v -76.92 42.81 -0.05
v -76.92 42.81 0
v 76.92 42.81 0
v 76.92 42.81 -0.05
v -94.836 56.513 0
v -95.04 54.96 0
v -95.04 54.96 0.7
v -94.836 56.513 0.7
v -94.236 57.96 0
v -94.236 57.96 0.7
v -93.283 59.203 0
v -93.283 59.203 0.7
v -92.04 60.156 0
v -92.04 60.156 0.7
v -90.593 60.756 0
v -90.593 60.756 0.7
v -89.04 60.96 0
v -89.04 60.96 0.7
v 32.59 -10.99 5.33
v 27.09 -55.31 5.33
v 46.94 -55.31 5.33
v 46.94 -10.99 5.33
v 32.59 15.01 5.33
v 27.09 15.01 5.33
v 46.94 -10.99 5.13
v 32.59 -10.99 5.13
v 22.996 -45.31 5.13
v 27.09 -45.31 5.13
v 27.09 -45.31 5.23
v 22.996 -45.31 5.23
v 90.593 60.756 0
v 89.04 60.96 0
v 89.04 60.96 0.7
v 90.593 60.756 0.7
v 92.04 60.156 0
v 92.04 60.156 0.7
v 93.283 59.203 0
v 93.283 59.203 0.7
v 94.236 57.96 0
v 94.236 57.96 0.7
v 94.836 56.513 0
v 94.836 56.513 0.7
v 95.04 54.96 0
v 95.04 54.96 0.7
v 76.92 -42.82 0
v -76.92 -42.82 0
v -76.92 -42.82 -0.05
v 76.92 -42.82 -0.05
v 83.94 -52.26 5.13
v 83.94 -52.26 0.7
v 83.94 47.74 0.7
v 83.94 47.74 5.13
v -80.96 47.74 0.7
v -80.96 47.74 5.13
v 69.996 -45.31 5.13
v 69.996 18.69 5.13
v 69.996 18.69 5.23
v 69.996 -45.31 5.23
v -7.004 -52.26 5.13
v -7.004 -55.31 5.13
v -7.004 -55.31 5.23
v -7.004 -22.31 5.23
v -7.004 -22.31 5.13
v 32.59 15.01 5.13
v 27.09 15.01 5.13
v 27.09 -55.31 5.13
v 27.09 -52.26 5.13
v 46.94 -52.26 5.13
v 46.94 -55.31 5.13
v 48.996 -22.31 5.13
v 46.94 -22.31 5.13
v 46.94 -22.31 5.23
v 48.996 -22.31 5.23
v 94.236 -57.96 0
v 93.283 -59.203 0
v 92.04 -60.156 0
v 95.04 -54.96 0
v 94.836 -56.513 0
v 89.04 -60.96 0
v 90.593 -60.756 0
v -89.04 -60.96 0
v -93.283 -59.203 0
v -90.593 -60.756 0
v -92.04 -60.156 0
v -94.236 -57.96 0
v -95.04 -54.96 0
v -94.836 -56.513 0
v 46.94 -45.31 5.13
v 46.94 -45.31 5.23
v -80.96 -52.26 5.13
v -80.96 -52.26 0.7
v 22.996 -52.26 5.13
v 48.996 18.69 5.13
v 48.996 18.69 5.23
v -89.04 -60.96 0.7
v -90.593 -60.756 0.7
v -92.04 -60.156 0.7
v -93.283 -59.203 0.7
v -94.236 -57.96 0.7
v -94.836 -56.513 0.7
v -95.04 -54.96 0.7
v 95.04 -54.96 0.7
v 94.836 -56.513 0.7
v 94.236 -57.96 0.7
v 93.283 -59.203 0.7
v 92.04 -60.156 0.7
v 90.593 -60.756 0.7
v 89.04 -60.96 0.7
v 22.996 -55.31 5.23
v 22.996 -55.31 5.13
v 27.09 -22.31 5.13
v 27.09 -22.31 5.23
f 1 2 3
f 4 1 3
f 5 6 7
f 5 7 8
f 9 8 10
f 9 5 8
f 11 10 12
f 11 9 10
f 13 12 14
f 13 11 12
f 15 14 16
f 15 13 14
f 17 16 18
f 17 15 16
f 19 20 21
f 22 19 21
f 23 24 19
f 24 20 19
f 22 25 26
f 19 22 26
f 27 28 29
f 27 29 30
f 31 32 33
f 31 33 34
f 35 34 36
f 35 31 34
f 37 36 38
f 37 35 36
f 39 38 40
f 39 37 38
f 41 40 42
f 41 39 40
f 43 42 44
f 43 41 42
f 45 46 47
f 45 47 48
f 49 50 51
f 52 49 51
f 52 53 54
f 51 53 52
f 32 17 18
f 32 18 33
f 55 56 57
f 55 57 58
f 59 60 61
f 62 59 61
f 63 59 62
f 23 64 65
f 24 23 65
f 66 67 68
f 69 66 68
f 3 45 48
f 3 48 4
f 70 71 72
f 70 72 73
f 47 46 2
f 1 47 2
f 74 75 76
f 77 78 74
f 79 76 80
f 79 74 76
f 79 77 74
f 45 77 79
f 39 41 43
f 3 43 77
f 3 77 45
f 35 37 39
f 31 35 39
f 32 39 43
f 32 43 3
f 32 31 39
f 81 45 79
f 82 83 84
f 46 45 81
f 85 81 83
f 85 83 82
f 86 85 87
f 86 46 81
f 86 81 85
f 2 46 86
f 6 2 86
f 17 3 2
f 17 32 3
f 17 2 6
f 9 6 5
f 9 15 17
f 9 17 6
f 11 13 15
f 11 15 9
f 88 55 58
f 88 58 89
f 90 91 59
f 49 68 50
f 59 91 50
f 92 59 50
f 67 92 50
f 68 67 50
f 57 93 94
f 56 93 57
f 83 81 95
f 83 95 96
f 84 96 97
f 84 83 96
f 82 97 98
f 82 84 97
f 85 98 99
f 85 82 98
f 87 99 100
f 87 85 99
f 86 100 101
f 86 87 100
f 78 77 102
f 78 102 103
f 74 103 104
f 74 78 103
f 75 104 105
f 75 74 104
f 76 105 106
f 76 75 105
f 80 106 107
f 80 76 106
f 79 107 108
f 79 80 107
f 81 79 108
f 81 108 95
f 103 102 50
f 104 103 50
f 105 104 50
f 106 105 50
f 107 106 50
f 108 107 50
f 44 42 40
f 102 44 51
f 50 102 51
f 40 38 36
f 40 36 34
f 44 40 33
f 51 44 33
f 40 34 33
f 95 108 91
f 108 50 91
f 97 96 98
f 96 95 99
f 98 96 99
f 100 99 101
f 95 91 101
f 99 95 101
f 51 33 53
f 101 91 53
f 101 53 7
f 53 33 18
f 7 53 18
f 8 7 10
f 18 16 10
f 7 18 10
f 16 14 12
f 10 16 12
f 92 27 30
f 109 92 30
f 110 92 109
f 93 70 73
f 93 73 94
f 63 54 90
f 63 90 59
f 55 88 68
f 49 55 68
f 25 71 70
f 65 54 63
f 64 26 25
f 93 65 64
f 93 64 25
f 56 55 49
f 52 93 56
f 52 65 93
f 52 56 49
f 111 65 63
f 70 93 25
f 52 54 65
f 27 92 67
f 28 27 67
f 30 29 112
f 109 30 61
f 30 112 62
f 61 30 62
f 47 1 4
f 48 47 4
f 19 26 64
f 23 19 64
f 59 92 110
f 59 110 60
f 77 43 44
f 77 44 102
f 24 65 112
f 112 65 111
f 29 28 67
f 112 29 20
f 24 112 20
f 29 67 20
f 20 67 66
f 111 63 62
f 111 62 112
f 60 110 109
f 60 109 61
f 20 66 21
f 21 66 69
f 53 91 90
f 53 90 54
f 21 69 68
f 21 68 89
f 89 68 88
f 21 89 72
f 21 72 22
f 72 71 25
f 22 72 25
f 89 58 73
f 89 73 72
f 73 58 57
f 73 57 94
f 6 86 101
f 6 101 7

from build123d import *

# Parameters (mm, degrees)
BOSS_EXTRUDE1_DEPTH      = 0.7
SKETCH2_W                = 153.84
SKETCH2_H                = 85.63
CUT_EXTRUDE1_DEPTH       = 0.8
SKETCH3_W                = 153.84
SKETCH3_H                = 85.63
BOSS_EXTRUDE4_DEPTH      = 0.75
BOSS_EXTRUDE4_DEPTH_BACK = 0.05
SKETCH4_W                = 164.9
SKETCH4_H                = 100
BOSS_EXTRUDE5_DEPTH      = 4.43
BOSS_EXTRUDE6_DEPTH      = 0.1
BOSS_EXTRUDE7_DEPTH      = 0.2


with BuildPart() as part:
    # Sketch1 → Boss-Extrude1 (new body)
    with BuildSketch(Plane.XY):
        with BuildLine():
            Line((-89.04, 60.96), (89.04, 60.96))
            ThreePointArc((89.04, 60.96), (93.282640687, 59.202640687), (95.04, 54.96))
            Line((95.04, 54.96), (95.04, -54.96))
            ThreePointArc((95.04, -54.96), (93.282640687, -59.202640687), (89.04, -60.96))
            Line((89.04, -60.96), (-89.04, -60.96))
            ThreePointArc((-89.04, -60.96), (-93.282640687, -59.202640687), (-95.04, -54.96))
            Line((-95.04, -54.96), (-95.04, 54.96))
            ThreePointArc((-95.04, 54.96), (-93.282640687, 59.202640687), (-89.04, 60.96))
        make_face()
    extrude(amount=BOSS_EXTRUDE1_DEPTH)

    # Sketch2 → Cut-Extrude1 (cut)
    with BuildSketch(Plane.XY):
        with Locations((0, -0.005)):
            Rectangle(SKETCH2_W, SKETCH2_H)
    extrude(amount=CUT_EXTRUDE1_DEPTH, mode=Mode.SUBTRACT)

    # Sketch3 → Boss-Extrude4 (add, two sides)
    with BuildSketch(Plane.XY) as boss_extrude4_sk:
        with Locations((0, -0.005)):
            Rectangle(SKETCH3_W, SKETCH3_H)
    extrude(amount=BOSS_EXTRUDE4_DEPTH)
    extrude(boss_extrude4_sk.sketch, amount=-BOSS_EXTRUDE4_DEPTH_BACK)

    # Sketch4 → Boss-Extrude5 (add)
    with BuildSketch(Plane.XY.offset(0.7)):
        with Locations((1.49, -2.26)):
            Rectangle(SKETCH4_W, SKETCH4_H)
    extrude(amount=BOSS_EXTRUDE5_DEPTH)

    # Sketch5 → Boss-Extrude6 (add)
    with BuildSketch(Plane.XY.offset(5.13)):
        Polygon((48.995697603, 18.69), (69.995697603, 18.69), (69.995697603, -45.31), (22.995697603, -45.31), (22.995697603, -55.31), (-7.004302397, -55.31), (-7.004302397, -22.31), (48.995697603, -22.31), align=None)
    extrude(amount=BOSS_EXTRUDE6_DEPTH)

    # Sketch6 → Boss-Extrude7 (add)
    with BuildSketch(Plane.XY.offset(5.13)):
        Polygon((32.59, 15.01), (27.09, 15.01), (27.09, -55.31), (46.94, -55.31), (46.94, -10.99), (32.59, -10.99), align=None)
    extrude(amount=BOSS_EXTRUDE7_DEPTH)


solid = part.part
